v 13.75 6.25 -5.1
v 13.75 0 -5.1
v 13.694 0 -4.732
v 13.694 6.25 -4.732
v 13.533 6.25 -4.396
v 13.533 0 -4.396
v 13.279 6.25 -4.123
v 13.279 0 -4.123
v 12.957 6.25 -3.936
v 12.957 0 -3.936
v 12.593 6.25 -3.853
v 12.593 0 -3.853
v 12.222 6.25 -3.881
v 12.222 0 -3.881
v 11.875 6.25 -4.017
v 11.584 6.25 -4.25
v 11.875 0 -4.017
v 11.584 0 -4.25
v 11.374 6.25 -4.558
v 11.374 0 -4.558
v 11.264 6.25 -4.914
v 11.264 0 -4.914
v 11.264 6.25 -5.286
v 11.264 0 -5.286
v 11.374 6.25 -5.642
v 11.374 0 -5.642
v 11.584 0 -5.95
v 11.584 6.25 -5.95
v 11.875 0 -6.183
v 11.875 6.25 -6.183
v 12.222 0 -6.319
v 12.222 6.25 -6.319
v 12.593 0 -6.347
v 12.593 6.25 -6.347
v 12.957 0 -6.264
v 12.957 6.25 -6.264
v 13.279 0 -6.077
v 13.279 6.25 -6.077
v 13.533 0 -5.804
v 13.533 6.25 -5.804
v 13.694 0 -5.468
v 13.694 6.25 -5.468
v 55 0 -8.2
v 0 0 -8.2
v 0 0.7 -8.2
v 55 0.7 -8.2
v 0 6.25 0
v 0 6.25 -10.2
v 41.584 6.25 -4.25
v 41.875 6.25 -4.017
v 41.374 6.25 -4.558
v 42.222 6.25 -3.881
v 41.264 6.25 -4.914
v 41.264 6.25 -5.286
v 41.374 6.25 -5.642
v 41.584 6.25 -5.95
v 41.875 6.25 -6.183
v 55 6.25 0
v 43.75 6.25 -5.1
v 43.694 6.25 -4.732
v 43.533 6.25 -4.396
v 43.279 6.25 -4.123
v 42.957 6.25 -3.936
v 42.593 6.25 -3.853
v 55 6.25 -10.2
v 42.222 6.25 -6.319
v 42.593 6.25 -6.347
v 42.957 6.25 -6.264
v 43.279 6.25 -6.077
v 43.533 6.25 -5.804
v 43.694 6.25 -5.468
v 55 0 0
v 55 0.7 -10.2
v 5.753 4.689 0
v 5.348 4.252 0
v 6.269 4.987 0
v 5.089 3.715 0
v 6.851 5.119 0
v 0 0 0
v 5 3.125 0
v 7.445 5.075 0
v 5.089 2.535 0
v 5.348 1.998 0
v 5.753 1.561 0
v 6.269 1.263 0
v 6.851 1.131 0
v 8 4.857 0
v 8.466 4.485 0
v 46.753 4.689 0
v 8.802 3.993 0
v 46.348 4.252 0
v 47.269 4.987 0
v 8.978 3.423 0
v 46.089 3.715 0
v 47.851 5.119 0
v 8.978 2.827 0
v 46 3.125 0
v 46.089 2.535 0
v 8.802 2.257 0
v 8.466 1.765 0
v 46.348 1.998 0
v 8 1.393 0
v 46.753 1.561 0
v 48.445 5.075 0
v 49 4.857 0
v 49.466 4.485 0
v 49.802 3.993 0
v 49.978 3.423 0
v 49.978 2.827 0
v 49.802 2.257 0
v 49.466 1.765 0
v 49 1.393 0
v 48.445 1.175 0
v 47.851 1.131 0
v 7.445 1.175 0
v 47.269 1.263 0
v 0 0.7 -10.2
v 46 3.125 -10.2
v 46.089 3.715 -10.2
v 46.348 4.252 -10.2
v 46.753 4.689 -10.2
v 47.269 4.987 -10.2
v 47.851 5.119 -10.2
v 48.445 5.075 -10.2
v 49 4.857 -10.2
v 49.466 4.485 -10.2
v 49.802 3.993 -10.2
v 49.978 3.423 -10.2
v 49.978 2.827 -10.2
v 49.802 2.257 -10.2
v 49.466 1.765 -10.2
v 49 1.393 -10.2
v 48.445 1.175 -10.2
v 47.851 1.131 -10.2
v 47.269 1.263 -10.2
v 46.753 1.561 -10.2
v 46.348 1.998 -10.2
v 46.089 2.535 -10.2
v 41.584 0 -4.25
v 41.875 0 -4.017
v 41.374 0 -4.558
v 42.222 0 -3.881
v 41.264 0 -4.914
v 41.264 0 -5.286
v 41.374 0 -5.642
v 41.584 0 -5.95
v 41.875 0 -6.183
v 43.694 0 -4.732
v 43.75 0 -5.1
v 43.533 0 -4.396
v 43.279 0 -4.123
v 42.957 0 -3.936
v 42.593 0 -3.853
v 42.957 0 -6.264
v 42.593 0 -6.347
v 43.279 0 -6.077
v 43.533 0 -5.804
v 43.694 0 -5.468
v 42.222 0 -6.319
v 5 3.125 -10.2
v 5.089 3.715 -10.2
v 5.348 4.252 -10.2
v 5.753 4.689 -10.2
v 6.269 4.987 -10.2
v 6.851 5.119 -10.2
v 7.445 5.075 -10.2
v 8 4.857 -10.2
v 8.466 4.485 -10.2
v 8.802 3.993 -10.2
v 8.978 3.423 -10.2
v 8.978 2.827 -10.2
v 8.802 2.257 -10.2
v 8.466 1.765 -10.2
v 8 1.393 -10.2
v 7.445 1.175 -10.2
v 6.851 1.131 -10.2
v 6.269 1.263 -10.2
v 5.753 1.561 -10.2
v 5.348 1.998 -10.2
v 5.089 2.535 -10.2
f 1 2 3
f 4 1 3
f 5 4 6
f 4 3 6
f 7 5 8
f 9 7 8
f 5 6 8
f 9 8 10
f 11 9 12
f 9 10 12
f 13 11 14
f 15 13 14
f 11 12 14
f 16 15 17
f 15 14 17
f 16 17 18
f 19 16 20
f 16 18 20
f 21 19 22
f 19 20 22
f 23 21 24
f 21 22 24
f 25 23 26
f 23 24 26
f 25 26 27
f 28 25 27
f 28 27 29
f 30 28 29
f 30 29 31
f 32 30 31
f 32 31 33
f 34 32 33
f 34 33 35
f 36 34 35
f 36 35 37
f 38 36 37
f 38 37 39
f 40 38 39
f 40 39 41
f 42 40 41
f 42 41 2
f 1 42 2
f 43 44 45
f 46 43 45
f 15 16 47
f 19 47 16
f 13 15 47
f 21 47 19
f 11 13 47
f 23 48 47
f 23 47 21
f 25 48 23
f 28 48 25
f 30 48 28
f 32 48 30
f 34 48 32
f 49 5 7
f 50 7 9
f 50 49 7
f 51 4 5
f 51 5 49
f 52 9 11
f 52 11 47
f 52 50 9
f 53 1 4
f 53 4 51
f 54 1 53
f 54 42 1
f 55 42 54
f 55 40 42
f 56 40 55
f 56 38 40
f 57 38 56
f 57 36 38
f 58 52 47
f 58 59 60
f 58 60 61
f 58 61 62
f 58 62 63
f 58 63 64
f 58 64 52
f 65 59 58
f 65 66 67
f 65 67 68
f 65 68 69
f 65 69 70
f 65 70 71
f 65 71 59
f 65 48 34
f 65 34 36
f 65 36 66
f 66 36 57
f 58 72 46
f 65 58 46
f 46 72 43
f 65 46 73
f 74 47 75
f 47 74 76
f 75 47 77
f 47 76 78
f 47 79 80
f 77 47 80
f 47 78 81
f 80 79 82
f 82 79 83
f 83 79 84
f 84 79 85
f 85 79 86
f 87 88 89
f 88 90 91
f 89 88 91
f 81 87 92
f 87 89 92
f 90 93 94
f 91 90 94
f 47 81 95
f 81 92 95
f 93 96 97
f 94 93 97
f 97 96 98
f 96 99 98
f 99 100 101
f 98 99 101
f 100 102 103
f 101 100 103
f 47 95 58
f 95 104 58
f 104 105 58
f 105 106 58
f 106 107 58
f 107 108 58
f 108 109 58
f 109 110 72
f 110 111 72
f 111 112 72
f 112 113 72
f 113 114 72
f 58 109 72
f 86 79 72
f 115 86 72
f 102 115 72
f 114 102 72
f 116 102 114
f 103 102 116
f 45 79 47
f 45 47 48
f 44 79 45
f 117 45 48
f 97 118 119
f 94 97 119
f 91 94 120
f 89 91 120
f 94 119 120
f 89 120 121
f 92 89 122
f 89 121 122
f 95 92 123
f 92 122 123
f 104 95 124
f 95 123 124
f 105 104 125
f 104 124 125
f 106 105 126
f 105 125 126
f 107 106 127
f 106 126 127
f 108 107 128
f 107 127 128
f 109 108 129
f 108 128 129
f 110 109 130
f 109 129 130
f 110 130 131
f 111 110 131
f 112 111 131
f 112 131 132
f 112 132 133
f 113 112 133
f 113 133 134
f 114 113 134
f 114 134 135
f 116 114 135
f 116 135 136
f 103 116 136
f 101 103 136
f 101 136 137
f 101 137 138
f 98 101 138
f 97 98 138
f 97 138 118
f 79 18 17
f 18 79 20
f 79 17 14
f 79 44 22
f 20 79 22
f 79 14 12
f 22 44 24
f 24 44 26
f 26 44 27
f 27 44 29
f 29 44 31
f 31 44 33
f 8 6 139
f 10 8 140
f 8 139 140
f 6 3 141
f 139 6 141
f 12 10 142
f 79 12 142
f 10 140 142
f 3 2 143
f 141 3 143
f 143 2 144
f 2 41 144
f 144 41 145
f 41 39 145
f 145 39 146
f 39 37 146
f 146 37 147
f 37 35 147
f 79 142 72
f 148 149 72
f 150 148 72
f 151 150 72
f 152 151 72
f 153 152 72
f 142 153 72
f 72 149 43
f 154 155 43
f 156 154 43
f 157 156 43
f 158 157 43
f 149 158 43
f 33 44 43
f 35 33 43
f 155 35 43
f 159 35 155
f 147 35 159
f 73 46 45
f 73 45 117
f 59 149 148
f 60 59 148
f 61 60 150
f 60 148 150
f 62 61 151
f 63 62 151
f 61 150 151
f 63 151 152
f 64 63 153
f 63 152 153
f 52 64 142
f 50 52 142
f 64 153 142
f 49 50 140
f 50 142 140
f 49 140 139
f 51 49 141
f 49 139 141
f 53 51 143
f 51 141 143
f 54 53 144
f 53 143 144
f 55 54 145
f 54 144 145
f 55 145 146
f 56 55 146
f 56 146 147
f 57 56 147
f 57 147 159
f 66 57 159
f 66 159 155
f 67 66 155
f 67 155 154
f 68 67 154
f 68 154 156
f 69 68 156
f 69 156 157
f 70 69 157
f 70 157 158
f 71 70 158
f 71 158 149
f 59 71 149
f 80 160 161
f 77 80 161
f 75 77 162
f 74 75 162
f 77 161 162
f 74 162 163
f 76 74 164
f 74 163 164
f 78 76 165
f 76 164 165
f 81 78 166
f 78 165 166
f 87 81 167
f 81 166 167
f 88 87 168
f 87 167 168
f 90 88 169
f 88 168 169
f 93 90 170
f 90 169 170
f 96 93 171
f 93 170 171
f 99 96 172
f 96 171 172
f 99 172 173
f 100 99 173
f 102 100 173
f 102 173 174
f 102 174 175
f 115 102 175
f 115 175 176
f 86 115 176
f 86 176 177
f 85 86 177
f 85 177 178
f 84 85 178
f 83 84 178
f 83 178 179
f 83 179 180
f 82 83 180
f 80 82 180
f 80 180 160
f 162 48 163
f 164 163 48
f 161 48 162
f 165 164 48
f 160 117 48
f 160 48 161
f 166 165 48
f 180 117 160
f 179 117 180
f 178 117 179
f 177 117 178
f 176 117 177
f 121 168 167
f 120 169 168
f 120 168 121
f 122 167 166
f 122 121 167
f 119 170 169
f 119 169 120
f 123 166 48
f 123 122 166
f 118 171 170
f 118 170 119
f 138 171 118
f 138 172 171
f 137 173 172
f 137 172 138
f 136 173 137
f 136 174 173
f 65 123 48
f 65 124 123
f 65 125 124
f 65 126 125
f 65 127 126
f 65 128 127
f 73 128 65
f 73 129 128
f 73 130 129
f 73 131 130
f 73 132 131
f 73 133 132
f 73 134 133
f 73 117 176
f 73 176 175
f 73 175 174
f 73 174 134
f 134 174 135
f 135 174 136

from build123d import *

# Parameters (mm, degrees)
SKETCH1_W                  = 55
SKETCH1_H                  = 10.2
BOSS_EXTRUDE1_DEPTH        = 6.25
F_4_0_4_DIAMETER_HOLE1_D   = 4
F_2_5_2_5_DIAMETER_HOLE1_D = 2.5
SKETCH6_W                  = 2
SKETCH6_H                  = 0.7
CUT_EXTRUDE1_DEPTH         = 56


with BuildPart() as part:
    # Sketch1 → Boss-Extrude1 (new body)
    with BuildSketch(Plane(origin=(0, 0, 0), x_dir=(1, 0, 0), z_dir=(0, 1, 0))):
        with Locations((27.5, 5.1)):
            Rectangle(SKETCH1_W, SKETCH1_H)
    extrude(amount=BOSS_EXTRUDE1_DEPTH)

    # Ø4.0 (4) Diameter Hole1 (through all)
    with Locations(Plane.XY):
        with Locations((7, 3.125), (48, 3.125)):
            Hole(F_4_0_4_DIAMETER_HOLE1_D / 2)

    # Ø2.5 (2.5) Diameter Hole1 (through all)
    with Locations(Plane(origin=(0, 6.25, 0), x_dir=(-1, 0, 0), z_dir=(0, 1, 0))):
        with Locations((-12.5, -5.1), (-42.5, -5.1)):
            Hole(F_2_5_2_5_DIAMETER_HOLE1_D / 2)

    # Sketch6 → Cut-Extrude1 (cut, through all)
    with BuildSketch(Plane(origin=(55, 0, 0), x_dir=(0, 0, -1), z_dir=(1, 0, 0))):
        with Locations((9.2, 0.35)):
            Rectangle(SKETCH6_W, SKETCH6_H)
    extrude(amount=-CUT_EXTRUDE1_DEPTH, mode=Mode.SUBTRACT)


solid = part.part
